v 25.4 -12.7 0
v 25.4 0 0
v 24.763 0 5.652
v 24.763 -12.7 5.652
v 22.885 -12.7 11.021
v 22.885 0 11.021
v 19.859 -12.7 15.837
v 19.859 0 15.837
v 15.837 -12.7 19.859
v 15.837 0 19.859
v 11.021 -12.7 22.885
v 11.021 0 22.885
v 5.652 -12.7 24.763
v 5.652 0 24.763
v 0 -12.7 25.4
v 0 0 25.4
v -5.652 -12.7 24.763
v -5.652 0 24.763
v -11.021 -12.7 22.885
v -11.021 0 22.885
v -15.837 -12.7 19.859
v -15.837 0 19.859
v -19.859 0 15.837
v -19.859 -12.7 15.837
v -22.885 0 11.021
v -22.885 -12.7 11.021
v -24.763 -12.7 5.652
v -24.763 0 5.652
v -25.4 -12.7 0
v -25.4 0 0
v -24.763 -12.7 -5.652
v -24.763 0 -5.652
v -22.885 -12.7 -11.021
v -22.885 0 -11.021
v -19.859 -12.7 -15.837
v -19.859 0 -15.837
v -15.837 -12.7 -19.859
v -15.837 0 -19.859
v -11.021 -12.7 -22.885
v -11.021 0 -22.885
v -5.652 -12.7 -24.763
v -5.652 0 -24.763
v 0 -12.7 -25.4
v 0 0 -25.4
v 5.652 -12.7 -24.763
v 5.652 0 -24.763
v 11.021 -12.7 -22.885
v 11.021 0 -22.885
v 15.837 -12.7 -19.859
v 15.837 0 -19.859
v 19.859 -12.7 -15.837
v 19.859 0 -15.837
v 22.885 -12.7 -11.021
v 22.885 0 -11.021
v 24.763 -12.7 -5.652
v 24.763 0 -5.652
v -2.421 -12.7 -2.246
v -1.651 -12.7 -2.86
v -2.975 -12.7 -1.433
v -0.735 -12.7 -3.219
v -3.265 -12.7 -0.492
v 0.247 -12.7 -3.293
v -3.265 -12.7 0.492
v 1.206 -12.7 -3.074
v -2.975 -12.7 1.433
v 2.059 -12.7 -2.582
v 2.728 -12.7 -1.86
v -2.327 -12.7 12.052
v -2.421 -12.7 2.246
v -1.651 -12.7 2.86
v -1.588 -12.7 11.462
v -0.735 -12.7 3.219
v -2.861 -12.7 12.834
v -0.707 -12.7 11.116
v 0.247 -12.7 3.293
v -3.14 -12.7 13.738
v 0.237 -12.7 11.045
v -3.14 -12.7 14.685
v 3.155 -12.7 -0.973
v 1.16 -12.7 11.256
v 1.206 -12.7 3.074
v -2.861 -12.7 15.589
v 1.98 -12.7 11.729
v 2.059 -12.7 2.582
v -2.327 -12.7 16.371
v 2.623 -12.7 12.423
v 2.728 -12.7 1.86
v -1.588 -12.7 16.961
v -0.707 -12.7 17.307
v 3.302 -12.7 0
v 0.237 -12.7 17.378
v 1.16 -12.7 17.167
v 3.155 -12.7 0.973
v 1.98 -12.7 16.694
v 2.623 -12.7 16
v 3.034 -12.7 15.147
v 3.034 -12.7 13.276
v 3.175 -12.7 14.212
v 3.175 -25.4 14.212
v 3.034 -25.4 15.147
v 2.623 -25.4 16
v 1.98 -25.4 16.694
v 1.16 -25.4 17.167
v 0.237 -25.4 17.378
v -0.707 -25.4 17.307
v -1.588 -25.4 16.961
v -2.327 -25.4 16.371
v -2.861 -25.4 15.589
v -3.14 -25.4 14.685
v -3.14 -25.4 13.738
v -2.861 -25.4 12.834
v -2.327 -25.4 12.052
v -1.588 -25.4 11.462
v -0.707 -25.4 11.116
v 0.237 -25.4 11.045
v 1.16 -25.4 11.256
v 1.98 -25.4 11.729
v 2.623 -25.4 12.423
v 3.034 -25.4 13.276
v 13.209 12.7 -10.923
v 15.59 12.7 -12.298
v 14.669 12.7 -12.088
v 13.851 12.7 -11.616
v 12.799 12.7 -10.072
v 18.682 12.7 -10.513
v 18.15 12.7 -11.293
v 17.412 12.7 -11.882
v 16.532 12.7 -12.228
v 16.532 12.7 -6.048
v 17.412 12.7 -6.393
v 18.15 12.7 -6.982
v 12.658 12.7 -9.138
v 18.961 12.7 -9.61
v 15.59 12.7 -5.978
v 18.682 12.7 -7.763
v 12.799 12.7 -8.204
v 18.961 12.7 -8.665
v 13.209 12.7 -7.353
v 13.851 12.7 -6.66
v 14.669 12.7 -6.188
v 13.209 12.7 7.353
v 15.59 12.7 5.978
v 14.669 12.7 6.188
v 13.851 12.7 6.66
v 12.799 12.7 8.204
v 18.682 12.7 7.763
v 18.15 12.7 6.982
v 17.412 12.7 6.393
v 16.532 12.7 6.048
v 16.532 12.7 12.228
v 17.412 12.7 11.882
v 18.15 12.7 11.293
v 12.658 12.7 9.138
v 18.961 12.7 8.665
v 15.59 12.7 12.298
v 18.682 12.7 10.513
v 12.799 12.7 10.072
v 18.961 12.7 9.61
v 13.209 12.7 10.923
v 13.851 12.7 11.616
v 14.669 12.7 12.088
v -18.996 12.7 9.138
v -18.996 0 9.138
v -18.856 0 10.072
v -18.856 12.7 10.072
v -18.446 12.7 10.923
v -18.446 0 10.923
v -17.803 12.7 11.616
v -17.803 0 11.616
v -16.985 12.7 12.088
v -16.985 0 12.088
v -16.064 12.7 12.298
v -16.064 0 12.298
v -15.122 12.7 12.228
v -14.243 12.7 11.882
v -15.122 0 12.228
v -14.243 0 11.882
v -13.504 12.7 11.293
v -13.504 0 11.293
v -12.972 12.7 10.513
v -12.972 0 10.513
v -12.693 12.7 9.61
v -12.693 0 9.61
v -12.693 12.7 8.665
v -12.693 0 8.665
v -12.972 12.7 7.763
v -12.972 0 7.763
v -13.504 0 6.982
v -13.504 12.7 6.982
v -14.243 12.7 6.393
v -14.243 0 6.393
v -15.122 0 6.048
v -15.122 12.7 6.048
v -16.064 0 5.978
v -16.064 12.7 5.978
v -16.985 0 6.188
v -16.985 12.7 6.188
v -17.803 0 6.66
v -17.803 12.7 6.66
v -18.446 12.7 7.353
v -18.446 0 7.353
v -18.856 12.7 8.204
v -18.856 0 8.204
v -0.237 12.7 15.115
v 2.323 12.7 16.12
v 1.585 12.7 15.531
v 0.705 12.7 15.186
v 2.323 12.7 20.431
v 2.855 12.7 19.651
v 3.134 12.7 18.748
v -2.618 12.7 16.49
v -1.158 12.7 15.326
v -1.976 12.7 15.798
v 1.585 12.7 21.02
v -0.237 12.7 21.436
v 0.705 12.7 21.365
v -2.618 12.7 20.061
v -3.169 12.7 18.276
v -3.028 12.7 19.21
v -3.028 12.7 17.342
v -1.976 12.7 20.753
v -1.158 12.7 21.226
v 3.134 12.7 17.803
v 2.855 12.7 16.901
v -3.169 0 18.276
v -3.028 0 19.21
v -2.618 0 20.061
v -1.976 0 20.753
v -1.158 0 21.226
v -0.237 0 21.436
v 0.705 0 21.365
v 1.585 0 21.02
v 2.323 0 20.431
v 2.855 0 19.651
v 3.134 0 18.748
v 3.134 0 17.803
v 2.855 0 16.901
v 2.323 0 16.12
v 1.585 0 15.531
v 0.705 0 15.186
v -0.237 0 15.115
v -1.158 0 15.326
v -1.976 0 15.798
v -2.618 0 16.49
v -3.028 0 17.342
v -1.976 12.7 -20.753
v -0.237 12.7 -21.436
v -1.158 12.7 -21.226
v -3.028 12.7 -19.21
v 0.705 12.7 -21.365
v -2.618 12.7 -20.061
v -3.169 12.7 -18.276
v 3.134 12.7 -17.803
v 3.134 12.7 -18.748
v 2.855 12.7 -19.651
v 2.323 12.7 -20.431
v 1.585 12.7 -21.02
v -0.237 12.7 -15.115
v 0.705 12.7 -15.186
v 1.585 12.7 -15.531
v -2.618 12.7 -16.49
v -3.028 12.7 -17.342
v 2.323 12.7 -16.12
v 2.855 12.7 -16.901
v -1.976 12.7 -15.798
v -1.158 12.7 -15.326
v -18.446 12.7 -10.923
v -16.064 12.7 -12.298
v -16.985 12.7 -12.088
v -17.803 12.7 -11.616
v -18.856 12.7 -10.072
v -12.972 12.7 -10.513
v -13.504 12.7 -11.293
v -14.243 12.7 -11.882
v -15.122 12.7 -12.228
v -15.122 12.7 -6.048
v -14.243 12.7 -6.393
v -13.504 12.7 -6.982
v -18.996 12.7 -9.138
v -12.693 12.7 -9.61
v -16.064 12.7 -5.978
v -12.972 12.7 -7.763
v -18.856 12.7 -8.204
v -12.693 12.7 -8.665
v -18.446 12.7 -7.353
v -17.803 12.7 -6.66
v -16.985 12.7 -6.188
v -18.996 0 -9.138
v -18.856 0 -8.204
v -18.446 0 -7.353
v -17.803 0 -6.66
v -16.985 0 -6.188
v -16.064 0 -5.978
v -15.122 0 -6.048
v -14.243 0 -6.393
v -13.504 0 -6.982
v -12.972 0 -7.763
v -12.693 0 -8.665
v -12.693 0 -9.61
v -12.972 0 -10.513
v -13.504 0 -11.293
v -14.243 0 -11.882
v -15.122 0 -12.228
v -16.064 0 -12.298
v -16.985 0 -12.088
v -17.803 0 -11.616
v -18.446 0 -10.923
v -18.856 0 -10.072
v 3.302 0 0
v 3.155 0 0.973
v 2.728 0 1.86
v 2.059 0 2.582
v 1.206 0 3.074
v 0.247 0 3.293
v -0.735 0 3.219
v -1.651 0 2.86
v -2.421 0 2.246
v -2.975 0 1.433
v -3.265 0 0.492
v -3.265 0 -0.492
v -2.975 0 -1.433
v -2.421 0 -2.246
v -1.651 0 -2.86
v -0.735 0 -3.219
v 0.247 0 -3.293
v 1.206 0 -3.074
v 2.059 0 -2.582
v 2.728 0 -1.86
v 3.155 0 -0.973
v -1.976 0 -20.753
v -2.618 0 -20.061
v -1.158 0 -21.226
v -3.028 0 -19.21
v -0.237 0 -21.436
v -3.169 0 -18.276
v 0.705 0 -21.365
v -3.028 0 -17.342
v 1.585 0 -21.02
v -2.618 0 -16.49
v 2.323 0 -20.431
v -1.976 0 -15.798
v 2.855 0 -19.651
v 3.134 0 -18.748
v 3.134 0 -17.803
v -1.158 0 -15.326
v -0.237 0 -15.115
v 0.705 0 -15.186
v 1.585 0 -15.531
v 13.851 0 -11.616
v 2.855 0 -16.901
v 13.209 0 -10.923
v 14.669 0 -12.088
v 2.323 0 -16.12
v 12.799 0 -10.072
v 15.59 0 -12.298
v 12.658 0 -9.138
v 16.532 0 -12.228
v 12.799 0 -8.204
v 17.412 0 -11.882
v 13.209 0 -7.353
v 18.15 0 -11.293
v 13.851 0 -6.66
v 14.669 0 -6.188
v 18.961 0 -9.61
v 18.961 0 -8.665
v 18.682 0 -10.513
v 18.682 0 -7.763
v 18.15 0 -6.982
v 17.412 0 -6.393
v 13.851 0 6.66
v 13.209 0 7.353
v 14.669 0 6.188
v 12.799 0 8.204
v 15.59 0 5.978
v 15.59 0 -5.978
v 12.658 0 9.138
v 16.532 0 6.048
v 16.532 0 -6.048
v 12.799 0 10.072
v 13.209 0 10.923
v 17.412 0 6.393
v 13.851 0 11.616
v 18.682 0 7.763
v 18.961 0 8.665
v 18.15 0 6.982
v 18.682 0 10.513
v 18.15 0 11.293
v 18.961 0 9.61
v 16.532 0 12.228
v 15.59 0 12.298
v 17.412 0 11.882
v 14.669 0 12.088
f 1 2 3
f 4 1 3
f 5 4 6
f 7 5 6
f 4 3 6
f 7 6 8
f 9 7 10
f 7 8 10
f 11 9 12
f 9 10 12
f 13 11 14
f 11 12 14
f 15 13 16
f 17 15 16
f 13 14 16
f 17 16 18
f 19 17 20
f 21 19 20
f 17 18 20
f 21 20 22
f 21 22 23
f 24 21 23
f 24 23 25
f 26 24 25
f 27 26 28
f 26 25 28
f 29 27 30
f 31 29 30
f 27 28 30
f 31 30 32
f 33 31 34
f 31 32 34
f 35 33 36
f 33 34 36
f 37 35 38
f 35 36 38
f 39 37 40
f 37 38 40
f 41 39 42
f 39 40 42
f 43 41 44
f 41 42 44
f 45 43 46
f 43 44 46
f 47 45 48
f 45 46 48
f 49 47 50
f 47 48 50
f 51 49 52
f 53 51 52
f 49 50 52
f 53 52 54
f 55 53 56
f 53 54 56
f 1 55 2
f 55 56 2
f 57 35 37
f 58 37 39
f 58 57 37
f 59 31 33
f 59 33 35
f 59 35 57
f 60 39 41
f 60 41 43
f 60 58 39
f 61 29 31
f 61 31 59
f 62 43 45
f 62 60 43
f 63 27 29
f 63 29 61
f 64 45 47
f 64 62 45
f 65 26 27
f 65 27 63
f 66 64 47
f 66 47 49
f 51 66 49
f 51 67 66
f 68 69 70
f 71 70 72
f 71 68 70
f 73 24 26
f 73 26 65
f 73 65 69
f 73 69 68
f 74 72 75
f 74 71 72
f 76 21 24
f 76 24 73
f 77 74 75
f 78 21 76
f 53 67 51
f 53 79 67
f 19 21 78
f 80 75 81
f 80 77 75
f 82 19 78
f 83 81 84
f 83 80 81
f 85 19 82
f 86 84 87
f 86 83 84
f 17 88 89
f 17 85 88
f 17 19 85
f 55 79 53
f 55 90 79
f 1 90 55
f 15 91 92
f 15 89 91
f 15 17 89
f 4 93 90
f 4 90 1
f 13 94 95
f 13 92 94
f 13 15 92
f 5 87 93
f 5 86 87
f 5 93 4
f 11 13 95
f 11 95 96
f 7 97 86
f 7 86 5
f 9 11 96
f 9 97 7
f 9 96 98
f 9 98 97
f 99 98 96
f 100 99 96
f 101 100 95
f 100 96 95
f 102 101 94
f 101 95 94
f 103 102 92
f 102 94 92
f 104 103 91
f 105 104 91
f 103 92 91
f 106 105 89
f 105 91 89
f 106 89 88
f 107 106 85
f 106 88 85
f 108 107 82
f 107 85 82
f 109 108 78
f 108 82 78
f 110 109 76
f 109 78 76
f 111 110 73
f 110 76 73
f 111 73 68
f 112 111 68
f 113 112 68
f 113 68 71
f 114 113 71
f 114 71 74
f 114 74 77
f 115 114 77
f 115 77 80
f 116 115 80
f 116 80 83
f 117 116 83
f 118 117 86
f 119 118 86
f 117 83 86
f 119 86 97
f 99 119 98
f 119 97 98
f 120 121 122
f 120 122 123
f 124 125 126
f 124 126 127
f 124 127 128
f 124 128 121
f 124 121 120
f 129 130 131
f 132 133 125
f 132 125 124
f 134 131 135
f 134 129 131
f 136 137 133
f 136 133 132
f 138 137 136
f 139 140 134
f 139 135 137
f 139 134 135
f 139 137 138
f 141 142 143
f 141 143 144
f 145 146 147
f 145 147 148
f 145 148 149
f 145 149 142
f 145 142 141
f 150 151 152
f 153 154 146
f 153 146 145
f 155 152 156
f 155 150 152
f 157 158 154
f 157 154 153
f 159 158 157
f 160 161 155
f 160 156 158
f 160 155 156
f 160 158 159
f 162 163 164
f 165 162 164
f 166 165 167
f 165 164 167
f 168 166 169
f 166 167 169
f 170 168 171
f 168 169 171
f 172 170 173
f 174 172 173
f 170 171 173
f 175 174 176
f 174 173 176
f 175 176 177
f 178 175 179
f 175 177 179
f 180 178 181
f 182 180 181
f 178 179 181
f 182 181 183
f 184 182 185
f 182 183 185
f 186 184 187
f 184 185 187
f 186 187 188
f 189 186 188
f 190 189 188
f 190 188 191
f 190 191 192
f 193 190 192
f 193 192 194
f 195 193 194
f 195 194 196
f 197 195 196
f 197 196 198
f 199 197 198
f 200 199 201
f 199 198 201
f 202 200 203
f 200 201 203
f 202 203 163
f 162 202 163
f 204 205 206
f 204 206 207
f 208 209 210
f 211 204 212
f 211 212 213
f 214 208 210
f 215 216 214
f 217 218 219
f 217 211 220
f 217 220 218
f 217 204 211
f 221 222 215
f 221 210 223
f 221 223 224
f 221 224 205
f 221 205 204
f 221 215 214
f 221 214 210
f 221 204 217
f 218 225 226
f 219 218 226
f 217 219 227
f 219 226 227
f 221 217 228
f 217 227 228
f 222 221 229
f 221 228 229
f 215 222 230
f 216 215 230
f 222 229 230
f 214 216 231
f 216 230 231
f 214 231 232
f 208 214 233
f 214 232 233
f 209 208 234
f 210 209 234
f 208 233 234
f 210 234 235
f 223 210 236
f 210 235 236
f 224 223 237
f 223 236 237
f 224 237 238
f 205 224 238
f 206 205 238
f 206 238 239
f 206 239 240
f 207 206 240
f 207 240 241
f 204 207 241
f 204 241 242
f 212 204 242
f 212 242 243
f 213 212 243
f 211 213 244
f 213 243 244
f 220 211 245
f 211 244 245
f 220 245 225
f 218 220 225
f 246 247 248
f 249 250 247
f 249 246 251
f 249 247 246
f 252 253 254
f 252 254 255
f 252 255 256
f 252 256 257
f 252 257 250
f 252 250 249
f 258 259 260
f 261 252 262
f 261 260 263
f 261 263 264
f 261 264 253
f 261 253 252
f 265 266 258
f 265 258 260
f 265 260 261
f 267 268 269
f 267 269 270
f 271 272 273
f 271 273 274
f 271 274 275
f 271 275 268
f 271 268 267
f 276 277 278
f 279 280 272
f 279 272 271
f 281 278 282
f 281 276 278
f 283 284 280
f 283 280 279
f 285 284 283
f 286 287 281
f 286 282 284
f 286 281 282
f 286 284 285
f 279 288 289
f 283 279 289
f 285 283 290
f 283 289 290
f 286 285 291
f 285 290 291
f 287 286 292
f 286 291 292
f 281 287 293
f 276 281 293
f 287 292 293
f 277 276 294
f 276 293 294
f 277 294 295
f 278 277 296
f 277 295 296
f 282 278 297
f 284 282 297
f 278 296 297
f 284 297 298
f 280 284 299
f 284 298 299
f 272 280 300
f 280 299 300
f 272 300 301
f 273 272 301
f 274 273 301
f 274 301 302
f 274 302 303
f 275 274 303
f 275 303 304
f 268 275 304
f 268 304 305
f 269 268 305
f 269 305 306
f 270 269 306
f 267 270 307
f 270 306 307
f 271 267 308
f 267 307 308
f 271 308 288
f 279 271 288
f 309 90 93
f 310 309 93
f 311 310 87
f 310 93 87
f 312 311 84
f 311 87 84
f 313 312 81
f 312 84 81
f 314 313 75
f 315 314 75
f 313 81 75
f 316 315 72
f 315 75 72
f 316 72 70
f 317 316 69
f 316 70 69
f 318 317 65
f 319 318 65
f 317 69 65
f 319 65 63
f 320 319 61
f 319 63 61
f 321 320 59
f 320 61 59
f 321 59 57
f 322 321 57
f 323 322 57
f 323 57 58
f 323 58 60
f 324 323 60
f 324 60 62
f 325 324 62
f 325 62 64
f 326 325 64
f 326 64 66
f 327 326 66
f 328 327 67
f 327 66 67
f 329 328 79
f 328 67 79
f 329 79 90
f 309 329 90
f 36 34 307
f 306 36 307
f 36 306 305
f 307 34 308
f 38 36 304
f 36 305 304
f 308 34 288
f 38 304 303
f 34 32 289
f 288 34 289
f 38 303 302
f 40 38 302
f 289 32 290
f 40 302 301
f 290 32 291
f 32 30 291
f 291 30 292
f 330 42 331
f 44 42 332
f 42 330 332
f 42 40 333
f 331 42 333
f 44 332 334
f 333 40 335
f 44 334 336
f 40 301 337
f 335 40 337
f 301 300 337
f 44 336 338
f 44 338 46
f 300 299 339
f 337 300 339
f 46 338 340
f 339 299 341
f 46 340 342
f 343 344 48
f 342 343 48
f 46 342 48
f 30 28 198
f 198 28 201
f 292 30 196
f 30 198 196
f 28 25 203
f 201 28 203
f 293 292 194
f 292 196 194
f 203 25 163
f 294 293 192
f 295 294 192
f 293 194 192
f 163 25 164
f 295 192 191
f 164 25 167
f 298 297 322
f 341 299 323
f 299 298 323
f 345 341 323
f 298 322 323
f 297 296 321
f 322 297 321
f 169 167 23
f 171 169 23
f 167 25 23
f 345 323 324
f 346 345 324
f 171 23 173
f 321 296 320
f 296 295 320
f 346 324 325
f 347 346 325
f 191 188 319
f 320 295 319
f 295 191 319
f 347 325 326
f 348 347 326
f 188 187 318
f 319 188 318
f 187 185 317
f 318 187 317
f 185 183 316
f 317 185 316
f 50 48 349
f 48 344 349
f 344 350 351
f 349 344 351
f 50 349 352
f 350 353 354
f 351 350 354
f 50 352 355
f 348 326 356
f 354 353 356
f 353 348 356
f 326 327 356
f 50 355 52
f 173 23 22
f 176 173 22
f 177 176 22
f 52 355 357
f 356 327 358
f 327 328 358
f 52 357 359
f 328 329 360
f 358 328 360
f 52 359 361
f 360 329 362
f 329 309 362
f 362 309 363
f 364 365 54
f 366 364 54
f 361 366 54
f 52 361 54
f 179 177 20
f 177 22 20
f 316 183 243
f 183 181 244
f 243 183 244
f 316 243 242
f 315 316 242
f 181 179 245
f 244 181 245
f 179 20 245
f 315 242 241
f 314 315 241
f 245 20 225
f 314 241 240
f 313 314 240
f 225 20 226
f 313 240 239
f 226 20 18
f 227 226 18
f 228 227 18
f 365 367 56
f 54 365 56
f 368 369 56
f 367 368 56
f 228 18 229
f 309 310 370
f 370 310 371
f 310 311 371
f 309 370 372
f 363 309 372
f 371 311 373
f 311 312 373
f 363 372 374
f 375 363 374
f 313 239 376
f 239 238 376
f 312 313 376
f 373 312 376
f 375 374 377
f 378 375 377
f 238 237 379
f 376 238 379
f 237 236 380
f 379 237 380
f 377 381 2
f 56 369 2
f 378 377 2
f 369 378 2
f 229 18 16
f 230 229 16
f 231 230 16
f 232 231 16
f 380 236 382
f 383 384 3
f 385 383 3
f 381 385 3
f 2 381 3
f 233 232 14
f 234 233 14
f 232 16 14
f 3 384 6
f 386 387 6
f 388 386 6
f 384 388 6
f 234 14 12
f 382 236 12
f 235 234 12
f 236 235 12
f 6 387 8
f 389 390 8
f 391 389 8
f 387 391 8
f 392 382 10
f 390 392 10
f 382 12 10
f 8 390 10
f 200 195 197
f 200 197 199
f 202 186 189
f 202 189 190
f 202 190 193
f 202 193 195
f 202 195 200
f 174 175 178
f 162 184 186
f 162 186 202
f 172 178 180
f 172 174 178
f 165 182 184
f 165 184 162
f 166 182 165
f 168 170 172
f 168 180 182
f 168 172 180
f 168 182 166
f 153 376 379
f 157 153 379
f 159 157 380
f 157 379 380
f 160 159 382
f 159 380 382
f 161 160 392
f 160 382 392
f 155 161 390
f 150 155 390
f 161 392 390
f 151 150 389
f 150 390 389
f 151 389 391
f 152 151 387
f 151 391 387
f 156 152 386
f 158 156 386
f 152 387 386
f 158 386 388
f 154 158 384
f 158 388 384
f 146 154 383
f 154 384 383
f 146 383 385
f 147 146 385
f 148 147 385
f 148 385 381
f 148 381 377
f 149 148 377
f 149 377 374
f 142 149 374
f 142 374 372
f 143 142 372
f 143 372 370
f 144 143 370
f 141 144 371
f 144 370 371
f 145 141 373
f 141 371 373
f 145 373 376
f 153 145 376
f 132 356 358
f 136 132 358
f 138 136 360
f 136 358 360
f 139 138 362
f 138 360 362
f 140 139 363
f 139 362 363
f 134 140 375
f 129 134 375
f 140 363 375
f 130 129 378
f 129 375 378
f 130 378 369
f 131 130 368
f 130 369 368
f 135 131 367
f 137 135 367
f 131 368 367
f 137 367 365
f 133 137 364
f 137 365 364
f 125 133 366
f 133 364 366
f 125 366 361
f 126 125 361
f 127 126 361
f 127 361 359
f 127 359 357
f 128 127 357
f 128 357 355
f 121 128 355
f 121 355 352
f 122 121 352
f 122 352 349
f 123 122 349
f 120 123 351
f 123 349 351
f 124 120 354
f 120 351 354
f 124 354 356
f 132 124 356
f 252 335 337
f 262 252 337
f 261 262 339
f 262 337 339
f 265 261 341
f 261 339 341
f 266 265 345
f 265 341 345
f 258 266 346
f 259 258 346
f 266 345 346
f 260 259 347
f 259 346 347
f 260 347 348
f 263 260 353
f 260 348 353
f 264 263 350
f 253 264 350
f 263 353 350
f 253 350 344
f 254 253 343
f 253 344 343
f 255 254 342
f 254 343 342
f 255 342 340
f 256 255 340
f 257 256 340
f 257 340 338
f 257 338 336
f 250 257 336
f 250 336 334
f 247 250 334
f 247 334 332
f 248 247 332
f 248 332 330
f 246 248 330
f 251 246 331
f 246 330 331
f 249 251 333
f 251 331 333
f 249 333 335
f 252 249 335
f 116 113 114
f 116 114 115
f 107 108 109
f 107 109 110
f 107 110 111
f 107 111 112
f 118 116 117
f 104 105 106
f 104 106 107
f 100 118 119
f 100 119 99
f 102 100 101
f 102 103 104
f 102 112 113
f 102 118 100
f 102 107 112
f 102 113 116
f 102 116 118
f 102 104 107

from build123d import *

# Parameters (mm, degrees)
F0_R     = 25.4
F1_DEPTH = 12.7
F2_R     = 3.302
F3_DEPTH = 12.7
F4_R     = 3.175
F5_DEPTH = 12.7
F6_R     = 3.169132
F7_DEPTH = 12.7


with BuildPart() as f1:
    # F0 (on Front) → F1 (new body)
    with BuildSketch(Plane.XZ):
        Circle(F0_R)
    extrude(amount=F1_DEPTH)

    # F2 (on face) → F3 (cut)
    with BuildSketch(Plane.XZ.offset(12.7)):
        Circle(F2_R)
    extrude(amount=-F3_DEPTH, mode=Mode.SUBTRACT)

    # F4 (on face) → F5 (join)
    with BuildSketch(Plane.XZ.offset(12.7)):
        with Locations((0, 14.211592)):
            Circle(F4_R)
    extrude(amount=F5_DEPTH)

    # F6 (on face) → F7 (join)
    with BuildSketch(Plane(origin=(0, 0, 0), x_dir=(-1, 0, 0), z_dir=(0, 1, 0))):
        with Locations((0, 18.275665)):
            Circle(F6_R)
        with Locations((-15.82719, 9.137833)):
            Circle(F6_R)
        with Locations((-15.82719, -9.137833)):
            Circle(F6_R)
        with Locations((0, -18.275665)):
            Circle(F6_R)
        with Locations((15.82719, -9.137833)):
            Circle(F6_R)
        with Locations((15.82719, 9.137833)):
            Circle(F6_R)
    extrude(amount=F7_DEPTH)


solid = f1.part
